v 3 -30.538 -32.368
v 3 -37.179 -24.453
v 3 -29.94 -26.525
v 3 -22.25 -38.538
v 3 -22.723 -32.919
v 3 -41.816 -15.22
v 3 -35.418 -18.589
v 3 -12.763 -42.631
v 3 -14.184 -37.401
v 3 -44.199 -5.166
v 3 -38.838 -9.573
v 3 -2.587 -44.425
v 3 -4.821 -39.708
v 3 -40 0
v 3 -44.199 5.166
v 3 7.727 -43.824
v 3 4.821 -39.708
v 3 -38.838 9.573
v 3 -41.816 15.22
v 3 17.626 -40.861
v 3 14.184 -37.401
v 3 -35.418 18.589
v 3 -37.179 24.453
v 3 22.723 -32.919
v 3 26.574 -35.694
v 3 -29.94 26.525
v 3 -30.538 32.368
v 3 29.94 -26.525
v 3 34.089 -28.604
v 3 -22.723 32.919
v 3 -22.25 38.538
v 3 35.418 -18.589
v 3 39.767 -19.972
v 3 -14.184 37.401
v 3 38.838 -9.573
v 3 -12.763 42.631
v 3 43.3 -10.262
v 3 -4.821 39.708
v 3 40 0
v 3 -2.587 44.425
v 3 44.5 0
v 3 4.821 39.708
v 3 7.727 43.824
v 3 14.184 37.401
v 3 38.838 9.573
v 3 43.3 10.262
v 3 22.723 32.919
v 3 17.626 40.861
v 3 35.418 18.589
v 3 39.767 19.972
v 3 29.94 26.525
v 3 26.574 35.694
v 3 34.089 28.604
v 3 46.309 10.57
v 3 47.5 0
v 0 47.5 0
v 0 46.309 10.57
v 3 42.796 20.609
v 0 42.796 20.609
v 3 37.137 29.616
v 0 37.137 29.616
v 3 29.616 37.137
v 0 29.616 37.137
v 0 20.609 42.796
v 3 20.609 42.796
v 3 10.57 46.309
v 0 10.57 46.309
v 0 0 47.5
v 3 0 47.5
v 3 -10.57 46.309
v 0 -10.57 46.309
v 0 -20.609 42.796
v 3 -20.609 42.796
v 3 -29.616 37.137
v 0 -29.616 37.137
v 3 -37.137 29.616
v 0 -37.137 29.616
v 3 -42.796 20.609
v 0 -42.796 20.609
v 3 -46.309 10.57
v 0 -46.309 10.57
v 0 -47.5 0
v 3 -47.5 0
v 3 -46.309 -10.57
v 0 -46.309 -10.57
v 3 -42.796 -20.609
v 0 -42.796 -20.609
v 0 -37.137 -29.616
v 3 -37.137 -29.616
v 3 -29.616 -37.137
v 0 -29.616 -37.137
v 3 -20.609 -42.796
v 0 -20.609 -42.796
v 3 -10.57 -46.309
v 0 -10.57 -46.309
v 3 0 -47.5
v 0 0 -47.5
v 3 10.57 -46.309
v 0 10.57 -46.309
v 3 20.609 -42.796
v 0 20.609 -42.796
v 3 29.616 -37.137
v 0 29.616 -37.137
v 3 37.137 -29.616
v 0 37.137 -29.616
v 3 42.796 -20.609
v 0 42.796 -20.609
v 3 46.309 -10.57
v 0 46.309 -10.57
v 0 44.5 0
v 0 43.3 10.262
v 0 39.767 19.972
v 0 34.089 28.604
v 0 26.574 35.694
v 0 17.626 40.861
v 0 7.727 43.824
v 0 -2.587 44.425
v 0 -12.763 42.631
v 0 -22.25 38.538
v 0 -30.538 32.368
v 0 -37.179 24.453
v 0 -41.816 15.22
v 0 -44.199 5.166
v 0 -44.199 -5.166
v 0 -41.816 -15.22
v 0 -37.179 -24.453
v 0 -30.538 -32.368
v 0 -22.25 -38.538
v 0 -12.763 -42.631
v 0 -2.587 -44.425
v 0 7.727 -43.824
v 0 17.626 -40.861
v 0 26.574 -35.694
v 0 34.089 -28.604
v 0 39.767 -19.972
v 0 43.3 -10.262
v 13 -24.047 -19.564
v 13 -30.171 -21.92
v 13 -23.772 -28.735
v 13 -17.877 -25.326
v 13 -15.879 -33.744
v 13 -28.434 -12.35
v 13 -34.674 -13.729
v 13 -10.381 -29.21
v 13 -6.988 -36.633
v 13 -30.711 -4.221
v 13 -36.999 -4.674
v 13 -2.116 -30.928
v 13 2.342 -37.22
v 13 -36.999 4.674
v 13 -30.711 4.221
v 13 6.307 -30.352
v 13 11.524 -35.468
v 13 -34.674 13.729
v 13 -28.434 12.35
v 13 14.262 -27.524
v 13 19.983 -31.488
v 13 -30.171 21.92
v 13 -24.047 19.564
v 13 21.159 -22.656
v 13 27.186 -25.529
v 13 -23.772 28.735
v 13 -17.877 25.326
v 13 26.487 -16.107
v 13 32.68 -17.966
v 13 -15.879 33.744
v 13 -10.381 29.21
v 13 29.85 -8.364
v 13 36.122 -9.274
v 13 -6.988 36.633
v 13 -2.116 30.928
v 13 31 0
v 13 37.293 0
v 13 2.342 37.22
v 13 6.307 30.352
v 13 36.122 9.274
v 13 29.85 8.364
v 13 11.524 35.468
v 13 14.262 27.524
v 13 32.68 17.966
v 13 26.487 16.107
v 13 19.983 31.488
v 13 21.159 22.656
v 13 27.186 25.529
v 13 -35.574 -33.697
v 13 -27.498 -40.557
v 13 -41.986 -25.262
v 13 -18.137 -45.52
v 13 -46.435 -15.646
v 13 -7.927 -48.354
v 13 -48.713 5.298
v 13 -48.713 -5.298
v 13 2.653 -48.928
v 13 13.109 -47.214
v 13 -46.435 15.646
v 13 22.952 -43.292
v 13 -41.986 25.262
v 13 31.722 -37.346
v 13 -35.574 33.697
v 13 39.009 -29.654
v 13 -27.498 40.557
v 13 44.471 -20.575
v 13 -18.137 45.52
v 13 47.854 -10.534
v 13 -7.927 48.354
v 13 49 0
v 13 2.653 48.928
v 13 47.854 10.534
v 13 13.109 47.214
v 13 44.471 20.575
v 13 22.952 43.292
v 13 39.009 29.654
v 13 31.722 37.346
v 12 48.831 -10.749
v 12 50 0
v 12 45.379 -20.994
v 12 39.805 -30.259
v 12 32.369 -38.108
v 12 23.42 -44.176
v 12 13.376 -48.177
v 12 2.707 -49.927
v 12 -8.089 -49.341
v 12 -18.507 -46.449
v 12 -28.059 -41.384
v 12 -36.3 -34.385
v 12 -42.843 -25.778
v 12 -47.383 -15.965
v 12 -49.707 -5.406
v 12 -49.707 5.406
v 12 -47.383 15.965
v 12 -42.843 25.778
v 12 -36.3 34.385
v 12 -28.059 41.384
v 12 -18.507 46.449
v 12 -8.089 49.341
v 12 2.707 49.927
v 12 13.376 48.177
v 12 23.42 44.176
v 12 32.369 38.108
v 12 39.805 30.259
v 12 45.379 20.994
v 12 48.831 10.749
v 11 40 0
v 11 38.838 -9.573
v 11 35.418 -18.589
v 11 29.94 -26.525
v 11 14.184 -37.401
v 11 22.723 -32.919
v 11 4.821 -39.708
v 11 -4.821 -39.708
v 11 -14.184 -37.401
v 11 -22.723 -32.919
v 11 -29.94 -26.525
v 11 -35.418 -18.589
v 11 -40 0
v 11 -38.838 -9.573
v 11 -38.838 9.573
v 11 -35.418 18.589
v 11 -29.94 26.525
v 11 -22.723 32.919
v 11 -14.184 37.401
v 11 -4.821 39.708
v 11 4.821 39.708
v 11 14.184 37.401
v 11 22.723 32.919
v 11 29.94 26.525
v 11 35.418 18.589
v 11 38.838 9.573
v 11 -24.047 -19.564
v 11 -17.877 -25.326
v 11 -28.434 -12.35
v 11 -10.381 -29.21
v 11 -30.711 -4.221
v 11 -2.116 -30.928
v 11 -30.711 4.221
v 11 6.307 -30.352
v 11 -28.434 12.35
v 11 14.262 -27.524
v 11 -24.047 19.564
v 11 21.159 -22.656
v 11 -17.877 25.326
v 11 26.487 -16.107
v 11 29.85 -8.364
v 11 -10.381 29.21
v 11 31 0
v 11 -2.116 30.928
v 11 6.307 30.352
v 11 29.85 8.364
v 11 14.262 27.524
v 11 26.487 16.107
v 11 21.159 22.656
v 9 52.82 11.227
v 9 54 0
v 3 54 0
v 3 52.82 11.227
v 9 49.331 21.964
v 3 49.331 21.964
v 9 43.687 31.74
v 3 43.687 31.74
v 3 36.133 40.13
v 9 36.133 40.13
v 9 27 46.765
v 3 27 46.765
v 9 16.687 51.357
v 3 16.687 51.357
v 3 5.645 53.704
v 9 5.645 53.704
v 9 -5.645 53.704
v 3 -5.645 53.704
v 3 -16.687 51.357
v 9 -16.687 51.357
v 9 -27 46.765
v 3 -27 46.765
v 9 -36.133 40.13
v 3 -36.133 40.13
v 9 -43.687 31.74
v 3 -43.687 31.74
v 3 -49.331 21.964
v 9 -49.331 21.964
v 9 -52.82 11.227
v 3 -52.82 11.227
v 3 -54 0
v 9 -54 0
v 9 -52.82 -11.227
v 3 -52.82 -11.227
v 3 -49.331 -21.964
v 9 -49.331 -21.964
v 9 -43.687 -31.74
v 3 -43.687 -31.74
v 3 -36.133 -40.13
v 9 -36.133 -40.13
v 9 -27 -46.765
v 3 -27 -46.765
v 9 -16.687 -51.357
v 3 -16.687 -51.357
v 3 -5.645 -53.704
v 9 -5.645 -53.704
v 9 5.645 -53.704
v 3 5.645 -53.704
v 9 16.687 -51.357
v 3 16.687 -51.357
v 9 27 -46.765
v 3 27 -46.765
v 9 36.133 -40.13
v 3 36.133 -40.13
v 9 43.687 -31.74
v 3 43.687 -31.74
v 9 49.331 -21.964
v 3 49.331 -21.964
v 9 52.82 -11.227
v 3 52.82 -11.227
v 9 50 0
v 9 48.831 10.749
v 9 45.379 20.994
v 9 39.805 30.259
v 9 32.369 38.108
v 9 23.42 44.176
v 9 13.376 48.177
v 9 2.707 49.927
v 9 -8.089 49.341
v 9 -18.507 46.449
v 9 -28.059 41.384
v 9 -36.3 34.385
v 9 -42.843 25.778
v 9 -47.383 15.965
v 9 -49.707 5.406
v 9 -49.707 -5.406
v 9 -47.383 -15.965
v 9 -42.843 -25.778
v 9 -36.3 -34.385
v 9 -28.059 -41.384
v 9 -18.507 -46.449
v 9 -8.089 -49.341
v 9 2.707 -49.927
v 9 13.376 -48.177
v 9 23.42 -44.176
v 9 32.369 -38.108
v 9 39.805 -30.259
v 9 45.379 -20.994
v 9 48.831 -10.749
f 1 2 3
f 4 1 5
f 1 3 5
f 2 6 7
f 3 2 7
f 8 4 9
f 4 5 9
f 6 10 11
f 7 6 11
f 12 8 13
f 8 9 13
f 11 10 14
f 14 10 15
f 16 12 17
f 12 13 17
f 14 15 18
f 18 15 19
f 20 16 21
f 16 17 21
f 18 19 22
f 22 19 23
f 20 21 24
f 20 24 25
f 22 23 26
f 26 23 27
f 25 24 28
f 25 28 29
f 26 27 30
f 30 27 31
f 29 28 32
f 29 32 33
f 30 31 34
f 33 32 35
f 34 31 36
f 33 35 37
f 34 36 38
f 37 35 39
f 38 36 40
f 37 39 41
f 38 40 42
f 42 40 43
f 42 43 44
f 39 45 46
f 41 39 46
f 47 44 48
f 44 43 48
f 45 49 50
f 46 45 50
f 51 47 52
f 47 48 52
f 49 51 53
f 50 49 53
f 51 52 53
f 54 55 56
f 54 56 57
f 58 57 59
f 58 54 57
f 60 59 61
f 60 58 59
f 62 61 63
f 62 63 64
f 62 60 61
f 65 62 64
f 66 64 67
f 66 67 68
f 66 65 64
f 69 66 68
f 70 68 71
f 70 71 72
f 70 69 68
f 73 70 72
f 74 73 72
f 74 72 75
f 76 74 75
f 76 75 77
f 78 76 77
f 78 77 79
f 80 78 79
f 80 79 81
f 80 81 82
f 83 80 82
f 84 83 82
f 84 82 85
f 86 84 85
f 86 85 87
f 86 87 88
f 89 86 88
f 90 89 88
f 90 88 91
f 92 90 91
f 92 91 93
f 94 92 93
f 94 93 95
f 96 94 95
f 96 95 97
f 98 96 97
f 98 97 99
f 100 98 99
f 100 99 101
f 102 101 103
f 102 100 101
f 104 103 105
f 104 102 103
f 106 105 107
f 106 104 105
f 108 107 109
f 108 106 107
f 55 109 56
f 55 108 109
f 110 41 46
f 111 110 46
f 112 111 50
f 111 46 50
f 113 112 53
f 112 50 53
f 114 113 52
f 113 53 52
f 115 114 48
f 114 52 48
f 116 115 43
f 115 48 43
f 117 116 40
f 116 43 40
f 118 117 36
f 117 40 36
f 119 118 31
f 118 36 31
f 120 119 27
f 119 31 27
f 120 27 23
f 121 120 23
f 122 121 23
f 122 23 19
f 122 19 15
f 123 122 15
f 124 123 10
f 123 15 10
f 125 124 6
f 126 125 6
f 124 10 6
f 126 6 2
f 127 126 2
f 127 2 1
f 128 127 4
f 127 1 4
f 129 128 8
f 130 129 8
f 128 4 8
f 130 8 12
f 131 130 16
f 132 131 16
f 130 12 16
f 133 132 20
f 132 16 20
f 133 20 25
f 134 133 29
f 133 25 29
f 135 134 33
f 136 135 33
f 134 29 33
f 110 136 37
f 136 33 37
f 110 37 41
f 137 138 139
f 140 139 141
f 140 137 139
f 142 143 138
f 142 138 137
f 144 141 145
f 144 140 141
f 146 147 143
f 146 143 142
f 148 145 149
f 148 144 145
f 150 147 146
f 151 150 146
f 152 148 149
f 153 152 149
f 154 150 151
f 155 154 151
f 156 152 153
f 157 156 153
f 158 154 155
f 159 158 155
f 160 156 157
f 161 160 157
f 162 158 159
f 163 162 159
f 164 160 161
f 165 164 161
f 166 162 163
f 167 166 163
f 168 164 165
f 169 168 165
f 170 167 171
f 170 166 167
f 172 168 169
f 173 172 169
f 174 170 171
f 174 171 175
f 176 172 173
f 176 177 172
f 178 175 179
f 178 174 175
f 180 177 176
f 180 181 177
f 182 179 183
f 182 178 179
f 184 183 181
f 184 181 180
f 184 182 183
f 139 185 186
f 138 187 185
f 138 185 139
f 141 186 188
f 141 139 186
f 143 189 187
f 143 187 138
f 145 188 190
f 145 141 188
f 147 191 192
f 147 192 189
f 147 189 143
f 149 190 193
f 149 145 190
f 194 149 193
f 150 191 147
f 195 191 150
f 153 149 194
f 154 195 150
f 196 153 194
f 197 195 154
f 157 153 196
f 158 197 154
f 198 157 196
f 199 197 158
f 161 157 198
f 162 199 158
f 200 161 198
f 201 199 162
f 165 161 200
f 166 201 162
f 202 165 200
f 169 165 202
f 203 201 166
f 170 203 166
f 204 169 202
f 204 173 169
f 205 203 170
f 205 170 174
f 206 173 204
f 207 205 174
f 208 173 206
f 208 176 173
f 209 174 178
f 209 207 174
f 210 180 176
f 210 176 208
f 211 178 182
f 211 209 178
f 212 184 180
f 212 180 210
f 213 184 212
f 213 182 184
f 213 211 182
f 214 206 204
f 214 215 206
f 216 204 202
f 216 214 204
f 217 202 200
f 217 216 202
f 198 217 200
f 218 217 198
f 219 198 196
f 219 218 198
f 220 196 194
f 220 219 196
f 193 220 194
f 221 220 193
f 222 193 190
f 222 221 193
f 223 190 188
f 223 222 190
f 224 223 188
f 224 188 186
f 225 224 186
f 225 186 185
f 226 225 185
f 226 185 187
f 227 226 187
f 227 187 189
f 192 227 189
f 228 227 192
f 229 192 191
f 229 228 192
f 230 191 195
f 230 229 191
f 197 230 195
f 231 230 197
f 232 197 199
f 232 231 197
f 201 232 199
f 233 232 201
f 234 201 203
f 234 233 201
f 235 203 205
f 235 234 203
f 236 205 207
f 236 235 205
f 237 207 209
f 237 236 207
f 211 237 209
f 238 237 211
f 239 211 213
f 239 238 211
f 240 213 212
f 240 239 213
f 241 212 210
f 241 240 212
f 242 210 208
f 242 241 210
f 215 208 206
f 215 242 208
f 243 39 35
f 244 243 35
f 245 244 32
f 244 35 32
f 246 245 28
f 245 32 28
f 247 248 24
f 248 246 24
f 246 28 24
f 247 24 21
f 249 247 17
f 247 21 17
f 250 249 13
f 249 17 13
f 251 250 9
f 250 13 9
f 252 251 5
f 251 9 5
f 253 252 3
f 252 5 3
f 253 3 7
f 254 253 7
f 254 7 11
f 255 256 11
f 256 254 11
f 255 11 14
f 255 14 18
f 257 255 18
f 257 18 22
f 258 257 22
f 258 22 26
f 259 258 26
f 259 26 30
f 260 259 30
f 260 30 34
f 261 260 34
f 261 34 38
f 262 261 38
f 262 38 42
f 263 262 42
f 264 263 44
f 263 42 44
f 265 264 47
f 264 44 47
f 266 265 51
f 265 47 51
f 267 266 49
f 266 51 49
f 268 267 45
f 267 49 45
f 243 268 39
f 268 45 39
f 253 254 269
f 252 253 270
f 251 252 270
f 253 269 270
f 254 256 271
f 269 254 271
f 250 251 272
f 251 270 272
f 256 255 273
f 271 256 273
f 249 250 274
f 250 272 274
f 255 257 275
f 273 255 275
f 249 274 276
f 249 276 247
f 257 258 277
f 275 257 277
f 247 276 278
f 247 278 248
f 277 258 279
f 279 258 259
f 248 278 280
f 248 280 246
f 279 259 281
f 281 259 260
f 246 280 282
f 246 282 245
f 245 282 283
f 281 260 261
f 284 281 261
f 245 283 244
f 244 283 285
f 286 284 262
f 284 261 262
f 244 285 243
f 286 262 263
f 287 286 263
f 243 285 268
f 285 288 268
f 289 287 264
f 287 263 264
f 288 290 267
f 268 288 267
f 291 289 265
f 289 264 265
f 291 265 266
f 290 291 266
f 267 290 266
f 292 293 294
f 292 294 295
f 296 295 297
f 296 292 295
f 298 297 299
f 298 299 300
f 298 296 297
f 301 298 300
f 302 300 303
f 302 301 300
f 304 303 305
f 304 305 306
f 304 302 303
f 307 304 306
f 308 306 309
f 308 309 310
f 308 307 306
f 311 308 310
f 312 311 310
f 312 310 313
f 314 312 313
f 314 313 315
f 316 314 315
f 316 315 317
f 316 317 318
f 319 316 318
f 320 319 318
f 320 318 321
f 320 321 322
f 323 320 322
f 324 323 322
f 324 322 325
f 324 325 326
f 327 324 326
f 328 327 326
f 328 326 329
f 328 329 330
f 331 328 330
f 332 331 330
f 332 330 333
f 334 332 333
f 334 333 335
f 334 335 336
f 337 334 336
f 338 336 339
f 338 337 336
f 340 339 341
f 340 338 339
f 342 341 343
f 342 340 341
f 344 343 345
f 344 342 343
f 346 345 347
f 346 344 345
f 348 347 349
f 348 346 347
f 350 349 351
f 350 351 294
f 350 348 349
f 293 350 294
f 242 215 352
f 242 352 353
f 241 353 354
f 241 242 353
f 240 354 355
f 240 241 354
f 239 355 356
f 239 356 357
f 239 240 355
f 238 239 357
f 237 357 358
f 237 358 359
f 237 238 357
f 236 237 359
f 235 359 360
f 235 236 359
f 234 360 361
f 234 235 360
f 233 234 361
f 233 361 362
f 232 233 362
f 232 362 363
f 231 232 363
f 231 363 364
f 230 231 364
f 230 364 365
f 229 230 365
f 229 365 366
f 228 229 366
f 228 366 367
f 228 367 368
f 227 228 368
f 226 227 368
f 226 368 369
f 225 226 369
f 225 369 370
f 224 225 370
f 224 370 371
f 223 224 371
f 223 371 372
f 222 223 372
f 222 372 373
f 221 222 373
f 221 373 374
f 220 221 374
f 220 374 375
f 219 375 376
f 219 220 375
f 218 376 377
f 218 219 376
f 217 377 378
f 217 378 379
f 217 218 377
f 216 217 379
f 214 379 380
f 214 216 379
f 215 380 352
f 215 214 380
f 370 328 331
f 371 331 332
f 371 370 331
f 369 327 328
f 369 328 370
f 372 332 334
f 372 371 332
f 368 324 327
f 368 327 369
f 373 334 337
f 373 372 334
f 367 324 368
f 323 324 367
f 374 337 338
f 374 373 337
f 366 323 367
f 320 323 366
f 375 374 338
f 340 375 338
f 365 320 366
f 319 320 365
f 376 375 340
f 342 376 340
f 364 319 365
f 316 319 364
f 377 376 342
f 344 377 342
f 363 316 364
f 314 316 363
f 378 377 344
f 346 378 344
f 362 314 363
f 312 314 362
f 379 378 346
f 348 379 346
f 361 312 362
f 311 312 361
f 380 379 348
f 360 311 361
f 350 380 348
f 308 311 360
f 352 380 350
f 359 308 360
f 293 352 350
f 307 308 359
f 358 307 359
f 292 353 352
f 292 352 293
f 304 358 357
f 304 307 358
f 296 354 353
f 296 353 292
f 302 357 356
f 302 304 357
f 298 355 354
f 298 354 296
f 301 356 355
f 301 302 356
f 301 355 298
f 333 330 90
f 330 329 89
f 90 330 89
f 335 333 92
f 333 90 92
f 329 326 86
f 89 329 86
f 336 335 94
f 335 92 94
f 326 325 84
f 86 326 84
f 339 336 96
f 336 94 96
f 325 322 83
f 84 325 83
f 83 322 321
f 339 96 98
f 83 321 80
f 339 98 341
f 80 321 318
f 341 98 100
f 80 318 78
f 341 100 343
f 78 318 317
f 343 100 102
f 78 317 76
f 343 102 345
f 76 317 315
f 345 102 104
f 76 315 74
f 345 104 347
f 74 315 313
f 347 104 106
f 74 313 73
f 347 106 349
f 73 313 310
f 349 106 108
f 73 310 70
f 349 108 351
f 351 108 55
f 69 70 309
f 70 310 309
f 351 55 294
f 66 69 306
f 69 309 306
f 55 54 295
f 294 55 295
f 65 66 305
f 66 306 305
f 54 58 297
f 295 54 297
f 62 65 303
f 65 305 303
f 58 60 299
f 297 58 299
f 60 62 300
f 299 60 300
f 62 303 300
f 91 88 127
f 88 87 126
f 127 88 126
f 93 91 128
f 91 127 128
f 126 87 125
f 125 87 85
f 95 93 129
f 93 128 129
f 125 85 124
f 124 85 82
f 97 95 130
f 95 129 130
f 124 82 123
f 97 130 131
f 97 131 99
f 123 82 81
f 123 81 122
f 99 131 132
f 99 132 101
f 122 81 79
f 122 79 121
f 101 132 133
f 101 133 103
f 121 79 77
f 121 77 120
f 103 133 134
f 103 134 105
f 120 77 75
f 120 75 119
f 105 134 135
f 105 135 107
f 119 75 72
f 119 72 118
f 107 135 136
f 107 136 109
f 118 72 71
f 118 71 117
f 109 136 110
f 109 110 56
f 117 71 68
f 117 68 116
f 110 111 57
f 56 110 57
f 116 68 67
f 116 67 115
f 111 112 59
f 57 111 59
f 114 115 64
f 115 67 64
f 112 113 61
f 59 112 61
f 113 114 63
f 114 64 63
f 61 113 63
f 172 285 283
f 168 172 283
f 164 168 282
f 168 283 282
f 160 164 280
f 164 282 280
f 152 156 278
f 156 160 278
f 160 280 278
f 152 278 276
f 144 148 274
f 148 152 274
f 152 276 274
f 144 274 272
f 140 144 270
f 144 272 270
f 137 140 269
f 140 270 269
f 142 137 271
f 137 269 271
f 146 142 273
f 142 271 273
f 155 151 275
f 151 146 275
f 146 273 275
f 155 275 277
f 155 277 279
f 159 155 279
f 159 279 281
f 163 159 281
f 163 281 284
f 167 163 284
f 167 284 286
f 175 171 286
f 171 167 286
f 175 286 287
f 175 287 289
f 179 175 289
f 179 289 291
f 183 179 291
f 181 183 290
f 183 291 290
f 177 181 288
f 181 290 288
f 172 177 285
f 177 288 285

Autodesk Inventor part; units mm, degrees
ref_plane "YZ Plane" through (0, 0, 0) normal (1, 0, 0) x (0, 1, 0)
ref_plane "XZ Plane" through (0, 0, 0) normal (0, 1, 0) x (-1, 0, 0)
ref_plane "XY Plane" through (0, 0, 0) normal (0, 0, 1) x (1, 0, 0)
sketch "Эскиз1" plane through (0, 0, 0) normal (0, 0, 1) x (1, 0, 0)
  line L0 (0, 0) -> (29.4445, 0)
  line L1 (0, 47.5) -> (3, 47.5)
  line L2 (0, 47.5) -> (0, 44.5)
  line L3 (0, 44.5) -> (3, 44.5)
  line L4 (3, 47.5) -> (3, 54)
  line L5 (3, 54) -> (9, 54)
  line L6 (9, 54) -> (9, 50)
  line L7 (9, 50) -> (13, 50)
  line L8 (13, 50) -> (13, 37.2933)
  line L9 (13, 37.2933) -> (13, 31)
  line L10 (13, 31) -> (11, 31)
  line L11 (11, 31) -> (11, 40)
  line L12 (11, 40) -> (3, 40)
  line L13 (3, 40) -> (3, 44.5)
  dimension "d2" = 62
  dimension "d3" = 100
  dimension "d5" = 6
  dimension "d6" = 89
  dimension "d7" = 80
  dimension "d8" = 8
  dimension "d9" = 0
  dimension "d10" = 13
  dimension "d15" = 3
  dimension "d16" = 3
  dimension "d17" = 108
revolve "Вращение1" add sketch "Эскиз1" angle 360 about axis through (0, 0, 0) along (1, 0, 0)
chamfer "Фаска1" distance 1 angle 45 1 edges at (13, -50, 0)
properties part number "Крышка правая" material "Сталь, углеродистая"
